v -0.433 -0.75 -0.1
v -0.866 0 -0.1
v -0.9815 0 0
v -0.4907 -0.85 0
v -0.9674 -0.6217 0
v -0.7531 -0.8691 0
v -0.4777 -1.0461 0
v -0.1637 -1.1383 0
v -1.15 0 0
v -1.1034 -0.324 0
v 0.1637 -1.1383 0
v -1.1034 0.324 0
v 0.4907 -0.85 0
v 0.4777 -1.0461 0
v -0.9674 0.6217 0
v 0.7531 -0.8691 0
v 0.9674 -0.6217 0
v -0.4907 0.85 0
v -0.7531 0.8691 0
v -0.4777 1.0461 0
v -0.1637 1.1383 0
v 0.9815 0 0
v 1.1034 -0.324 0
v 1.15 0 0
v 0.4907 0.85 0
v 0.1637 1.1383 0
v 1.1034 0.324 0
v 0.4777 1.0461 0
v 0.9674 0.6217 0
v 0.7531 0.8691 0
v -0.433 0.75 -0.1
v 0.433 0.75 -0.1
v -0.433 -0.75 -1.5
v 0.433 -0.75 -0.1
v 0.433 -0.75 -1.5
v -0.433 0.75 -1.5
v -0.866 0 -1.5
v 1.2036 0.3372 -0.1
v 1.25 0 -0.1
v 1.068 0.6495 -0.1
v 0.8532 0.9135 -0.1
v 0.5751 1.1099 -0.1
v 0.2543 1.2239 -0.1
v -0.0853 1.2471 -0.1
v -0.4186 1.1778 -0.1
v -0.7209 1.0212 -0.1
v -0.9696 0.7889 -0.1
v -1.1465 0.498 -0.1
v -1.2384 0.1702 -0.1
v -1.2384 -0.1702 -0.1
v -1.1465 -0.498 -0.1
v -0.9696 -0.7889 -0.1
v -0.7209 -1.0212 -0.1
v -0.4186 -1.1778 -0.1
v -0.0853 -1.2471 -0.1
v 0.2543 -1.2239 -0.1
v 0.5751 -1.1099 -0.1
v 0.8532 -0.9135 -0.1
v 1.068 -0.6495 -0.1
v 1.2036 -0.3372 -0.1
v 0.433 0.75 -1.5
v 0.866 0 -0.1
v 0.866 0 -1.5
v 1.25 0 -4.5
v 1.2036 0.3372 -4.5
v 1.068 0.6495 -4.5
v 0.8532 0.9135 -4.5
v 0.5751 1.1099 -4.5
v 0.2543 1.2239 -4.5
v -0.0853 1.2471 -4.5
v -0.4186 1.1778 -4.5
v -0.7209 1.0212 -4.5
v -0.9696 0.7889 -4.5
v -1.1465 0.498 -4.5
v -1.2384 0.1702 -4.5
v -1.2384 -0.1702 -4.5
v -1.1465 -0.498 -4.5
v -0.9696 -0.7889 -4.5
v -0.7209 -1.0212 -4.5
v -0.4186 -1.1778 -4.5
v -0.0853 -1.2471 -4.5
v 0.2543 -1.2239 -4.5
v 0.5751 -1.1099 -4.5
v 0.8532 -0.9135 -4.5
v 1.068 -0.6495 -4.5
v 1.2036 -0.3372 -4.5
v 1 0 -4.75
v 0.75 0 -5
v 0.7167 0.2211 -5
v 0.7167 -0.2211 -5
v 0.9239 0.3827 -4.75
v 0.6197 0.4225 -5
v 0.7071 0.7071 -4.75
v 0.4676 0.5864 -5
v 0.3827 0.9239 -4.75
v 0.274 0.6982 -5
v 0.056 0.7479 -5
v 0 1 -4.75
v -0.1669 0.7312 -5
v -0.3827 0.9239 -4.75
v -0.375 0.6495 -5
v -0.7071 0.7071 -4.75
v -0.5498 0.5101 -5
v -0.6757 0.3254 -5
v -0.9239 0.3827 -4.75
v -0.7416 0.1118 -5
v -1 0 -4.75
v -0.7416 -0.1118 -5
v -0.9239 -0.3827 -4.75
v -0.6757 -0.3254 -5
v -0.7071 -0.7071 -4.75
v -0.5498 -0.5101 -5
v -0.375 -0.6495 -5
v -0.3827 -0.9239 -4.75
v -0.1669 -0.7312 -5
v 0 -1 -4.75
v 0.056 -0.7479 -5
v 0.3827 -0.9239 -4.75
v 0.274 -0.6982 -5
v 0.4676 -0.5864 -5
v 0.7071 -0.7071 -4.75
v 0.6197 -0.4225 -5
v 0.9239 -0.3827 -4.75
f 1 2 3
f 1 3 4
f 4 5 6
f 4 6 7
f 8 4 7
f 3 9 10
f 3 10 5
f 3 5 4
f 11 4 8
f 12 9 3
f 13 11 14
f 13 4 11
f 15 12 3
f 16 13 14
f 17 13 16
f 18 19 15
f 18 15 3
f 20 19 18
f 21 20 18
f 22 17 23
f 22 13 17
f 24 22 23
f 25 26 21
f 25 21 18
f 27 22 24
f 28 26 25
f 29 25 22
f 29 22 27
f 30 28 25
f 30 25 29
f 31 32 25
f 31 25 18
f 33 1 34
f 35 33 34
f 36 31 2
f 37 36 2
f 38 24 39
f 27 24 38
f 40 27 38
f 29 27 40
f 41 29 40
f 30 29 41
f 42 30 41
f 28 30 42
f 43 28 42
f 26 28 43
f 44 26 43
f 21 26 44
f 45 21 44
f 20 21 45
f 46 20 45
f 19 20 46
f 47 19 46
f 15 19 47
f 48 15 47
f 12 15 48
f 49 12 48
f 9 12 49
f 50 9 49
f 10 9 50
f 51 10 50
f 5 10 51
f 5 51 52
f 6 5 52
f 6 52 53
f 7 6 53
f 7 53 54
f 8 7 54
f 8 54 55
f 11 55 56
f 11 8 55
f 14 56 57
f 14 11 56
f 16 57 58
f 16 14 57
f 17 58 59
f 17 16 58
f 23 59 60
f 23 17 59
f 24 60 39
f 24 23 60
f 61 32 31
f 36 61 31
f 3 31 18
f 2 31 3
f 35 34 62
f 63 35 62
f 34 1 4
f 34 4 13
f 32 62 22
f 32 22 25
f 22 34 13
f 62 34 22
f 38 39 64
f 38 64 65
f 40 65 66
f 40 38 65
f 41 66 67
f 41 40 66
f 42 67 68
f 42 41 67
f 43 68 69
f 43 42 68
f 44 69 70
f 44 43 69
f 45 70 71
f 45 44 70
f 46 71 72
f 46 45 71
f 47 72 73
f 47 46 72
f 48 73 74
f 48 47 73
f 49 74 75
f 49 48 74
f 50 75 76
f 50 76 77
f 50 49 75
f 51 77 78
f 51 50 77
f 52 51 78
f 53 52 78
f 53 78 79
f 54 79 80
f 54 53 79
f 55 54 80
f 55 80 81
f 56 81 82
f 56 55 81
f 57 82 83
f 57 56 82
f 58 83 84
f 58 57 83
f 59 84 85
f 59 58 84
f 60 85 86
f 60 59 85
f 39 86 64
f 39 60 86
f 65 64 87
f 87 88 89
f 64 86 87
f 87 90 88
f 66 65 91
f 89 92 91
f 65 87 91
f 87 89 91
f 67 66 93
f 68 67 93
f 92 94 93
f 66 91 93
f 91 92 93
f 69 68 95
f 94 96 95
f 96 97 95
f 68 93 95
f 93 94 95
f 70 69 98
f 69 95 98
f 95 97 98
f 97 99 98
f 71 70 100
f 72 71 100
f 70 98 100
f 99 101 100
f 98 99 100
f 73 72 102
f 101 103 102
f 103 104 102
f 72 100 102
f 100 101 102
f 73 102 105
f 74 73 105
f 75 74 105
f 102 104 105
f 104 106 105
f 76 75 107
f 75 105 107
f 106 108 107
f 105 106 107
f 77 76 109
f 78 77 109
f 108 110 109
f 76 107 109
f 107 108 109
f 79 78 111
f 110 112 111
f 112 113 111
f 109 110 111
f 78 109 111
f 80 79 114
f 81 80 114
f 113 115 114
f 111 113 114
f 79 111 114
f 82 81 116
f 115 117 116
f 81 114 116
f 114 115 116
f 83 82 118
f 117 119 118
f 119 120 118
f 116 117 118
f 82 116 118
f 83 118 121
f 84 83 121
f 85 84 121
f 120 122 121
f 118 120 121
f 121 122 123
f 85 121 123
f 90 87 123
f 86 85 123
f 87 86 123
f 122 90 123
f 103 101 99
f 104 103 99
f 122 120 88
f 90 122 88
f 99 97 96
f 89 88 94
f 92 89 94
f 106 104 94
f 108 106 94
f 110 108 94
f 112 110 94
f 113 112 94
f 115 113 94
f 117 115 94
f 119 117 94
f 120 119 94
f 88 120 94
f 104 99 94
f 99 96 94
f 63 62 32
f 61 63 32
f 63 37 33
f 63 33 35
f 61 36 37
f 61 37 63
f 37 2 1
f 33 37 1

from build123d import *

# Parameters (mm, degrees)
F0_R     = 1.25
F1_DEPTH = 5
F2_DEPTH = 1.5
F3_SIZE  = 0.1
F4_SIZE  = 0.5


with BuildPart() as f1:
    # F0 (on Top) → F1 (new body)
    with BuildSketch(Plane.XY):
        Circle(F0_R)
        Polygon((-0.866025, 0), (-0.433013, 0.75), (0.433013, 0.75), (0.866025, 0), (0.433013, -0.75), (-0.433013, -0.75), align=None, mode=Mode.SUBTRACT)
        Polygon((0.433013, 0.75), (-0.433013, 0.75), (-0.866025, 0), (-0.433013, -0.75), (0.433013, -0.75), (0.866025, 0), align=None)
    extrude(amount=-F1_DEPTH)

    # F0 (on Top) → F2 (cut)
    with BuildSketch(Plane.XY):
        Polygon((0.433013, 0.75), (-0.433013, 0.75), (-0.866025, 0), (-0.433013, -0.75), (0.433013, -0.75), (0.866025, 0), align=None)
    extrude(amount=-F2_DEPTH, mode=Mode.SUBTRACT)

    # F3
    f3_edges = [f1.edges().sort_by_distance(p)[0] for p in [
        (-1.25, 0, 0),
        (0, 0.75, 0),
        (-0.649519, 0.375, 0),
        (-0.649519, -0.375, 0),
        (0, -0.75, 0),
        (0.649519, -0.375, 0),
        (0.649519, 0.375, 0),
    ]]
    chamfer(f3_edges, length=F3_SIZE)

    # F4
    f4_edges = [f1.edges().sort_by_distance(p)[0] for p in [
        (-1.25, 0, -5),
    ]]
    chamfer(f4_edges, length=F4_SIZE)


solid = f1.part
